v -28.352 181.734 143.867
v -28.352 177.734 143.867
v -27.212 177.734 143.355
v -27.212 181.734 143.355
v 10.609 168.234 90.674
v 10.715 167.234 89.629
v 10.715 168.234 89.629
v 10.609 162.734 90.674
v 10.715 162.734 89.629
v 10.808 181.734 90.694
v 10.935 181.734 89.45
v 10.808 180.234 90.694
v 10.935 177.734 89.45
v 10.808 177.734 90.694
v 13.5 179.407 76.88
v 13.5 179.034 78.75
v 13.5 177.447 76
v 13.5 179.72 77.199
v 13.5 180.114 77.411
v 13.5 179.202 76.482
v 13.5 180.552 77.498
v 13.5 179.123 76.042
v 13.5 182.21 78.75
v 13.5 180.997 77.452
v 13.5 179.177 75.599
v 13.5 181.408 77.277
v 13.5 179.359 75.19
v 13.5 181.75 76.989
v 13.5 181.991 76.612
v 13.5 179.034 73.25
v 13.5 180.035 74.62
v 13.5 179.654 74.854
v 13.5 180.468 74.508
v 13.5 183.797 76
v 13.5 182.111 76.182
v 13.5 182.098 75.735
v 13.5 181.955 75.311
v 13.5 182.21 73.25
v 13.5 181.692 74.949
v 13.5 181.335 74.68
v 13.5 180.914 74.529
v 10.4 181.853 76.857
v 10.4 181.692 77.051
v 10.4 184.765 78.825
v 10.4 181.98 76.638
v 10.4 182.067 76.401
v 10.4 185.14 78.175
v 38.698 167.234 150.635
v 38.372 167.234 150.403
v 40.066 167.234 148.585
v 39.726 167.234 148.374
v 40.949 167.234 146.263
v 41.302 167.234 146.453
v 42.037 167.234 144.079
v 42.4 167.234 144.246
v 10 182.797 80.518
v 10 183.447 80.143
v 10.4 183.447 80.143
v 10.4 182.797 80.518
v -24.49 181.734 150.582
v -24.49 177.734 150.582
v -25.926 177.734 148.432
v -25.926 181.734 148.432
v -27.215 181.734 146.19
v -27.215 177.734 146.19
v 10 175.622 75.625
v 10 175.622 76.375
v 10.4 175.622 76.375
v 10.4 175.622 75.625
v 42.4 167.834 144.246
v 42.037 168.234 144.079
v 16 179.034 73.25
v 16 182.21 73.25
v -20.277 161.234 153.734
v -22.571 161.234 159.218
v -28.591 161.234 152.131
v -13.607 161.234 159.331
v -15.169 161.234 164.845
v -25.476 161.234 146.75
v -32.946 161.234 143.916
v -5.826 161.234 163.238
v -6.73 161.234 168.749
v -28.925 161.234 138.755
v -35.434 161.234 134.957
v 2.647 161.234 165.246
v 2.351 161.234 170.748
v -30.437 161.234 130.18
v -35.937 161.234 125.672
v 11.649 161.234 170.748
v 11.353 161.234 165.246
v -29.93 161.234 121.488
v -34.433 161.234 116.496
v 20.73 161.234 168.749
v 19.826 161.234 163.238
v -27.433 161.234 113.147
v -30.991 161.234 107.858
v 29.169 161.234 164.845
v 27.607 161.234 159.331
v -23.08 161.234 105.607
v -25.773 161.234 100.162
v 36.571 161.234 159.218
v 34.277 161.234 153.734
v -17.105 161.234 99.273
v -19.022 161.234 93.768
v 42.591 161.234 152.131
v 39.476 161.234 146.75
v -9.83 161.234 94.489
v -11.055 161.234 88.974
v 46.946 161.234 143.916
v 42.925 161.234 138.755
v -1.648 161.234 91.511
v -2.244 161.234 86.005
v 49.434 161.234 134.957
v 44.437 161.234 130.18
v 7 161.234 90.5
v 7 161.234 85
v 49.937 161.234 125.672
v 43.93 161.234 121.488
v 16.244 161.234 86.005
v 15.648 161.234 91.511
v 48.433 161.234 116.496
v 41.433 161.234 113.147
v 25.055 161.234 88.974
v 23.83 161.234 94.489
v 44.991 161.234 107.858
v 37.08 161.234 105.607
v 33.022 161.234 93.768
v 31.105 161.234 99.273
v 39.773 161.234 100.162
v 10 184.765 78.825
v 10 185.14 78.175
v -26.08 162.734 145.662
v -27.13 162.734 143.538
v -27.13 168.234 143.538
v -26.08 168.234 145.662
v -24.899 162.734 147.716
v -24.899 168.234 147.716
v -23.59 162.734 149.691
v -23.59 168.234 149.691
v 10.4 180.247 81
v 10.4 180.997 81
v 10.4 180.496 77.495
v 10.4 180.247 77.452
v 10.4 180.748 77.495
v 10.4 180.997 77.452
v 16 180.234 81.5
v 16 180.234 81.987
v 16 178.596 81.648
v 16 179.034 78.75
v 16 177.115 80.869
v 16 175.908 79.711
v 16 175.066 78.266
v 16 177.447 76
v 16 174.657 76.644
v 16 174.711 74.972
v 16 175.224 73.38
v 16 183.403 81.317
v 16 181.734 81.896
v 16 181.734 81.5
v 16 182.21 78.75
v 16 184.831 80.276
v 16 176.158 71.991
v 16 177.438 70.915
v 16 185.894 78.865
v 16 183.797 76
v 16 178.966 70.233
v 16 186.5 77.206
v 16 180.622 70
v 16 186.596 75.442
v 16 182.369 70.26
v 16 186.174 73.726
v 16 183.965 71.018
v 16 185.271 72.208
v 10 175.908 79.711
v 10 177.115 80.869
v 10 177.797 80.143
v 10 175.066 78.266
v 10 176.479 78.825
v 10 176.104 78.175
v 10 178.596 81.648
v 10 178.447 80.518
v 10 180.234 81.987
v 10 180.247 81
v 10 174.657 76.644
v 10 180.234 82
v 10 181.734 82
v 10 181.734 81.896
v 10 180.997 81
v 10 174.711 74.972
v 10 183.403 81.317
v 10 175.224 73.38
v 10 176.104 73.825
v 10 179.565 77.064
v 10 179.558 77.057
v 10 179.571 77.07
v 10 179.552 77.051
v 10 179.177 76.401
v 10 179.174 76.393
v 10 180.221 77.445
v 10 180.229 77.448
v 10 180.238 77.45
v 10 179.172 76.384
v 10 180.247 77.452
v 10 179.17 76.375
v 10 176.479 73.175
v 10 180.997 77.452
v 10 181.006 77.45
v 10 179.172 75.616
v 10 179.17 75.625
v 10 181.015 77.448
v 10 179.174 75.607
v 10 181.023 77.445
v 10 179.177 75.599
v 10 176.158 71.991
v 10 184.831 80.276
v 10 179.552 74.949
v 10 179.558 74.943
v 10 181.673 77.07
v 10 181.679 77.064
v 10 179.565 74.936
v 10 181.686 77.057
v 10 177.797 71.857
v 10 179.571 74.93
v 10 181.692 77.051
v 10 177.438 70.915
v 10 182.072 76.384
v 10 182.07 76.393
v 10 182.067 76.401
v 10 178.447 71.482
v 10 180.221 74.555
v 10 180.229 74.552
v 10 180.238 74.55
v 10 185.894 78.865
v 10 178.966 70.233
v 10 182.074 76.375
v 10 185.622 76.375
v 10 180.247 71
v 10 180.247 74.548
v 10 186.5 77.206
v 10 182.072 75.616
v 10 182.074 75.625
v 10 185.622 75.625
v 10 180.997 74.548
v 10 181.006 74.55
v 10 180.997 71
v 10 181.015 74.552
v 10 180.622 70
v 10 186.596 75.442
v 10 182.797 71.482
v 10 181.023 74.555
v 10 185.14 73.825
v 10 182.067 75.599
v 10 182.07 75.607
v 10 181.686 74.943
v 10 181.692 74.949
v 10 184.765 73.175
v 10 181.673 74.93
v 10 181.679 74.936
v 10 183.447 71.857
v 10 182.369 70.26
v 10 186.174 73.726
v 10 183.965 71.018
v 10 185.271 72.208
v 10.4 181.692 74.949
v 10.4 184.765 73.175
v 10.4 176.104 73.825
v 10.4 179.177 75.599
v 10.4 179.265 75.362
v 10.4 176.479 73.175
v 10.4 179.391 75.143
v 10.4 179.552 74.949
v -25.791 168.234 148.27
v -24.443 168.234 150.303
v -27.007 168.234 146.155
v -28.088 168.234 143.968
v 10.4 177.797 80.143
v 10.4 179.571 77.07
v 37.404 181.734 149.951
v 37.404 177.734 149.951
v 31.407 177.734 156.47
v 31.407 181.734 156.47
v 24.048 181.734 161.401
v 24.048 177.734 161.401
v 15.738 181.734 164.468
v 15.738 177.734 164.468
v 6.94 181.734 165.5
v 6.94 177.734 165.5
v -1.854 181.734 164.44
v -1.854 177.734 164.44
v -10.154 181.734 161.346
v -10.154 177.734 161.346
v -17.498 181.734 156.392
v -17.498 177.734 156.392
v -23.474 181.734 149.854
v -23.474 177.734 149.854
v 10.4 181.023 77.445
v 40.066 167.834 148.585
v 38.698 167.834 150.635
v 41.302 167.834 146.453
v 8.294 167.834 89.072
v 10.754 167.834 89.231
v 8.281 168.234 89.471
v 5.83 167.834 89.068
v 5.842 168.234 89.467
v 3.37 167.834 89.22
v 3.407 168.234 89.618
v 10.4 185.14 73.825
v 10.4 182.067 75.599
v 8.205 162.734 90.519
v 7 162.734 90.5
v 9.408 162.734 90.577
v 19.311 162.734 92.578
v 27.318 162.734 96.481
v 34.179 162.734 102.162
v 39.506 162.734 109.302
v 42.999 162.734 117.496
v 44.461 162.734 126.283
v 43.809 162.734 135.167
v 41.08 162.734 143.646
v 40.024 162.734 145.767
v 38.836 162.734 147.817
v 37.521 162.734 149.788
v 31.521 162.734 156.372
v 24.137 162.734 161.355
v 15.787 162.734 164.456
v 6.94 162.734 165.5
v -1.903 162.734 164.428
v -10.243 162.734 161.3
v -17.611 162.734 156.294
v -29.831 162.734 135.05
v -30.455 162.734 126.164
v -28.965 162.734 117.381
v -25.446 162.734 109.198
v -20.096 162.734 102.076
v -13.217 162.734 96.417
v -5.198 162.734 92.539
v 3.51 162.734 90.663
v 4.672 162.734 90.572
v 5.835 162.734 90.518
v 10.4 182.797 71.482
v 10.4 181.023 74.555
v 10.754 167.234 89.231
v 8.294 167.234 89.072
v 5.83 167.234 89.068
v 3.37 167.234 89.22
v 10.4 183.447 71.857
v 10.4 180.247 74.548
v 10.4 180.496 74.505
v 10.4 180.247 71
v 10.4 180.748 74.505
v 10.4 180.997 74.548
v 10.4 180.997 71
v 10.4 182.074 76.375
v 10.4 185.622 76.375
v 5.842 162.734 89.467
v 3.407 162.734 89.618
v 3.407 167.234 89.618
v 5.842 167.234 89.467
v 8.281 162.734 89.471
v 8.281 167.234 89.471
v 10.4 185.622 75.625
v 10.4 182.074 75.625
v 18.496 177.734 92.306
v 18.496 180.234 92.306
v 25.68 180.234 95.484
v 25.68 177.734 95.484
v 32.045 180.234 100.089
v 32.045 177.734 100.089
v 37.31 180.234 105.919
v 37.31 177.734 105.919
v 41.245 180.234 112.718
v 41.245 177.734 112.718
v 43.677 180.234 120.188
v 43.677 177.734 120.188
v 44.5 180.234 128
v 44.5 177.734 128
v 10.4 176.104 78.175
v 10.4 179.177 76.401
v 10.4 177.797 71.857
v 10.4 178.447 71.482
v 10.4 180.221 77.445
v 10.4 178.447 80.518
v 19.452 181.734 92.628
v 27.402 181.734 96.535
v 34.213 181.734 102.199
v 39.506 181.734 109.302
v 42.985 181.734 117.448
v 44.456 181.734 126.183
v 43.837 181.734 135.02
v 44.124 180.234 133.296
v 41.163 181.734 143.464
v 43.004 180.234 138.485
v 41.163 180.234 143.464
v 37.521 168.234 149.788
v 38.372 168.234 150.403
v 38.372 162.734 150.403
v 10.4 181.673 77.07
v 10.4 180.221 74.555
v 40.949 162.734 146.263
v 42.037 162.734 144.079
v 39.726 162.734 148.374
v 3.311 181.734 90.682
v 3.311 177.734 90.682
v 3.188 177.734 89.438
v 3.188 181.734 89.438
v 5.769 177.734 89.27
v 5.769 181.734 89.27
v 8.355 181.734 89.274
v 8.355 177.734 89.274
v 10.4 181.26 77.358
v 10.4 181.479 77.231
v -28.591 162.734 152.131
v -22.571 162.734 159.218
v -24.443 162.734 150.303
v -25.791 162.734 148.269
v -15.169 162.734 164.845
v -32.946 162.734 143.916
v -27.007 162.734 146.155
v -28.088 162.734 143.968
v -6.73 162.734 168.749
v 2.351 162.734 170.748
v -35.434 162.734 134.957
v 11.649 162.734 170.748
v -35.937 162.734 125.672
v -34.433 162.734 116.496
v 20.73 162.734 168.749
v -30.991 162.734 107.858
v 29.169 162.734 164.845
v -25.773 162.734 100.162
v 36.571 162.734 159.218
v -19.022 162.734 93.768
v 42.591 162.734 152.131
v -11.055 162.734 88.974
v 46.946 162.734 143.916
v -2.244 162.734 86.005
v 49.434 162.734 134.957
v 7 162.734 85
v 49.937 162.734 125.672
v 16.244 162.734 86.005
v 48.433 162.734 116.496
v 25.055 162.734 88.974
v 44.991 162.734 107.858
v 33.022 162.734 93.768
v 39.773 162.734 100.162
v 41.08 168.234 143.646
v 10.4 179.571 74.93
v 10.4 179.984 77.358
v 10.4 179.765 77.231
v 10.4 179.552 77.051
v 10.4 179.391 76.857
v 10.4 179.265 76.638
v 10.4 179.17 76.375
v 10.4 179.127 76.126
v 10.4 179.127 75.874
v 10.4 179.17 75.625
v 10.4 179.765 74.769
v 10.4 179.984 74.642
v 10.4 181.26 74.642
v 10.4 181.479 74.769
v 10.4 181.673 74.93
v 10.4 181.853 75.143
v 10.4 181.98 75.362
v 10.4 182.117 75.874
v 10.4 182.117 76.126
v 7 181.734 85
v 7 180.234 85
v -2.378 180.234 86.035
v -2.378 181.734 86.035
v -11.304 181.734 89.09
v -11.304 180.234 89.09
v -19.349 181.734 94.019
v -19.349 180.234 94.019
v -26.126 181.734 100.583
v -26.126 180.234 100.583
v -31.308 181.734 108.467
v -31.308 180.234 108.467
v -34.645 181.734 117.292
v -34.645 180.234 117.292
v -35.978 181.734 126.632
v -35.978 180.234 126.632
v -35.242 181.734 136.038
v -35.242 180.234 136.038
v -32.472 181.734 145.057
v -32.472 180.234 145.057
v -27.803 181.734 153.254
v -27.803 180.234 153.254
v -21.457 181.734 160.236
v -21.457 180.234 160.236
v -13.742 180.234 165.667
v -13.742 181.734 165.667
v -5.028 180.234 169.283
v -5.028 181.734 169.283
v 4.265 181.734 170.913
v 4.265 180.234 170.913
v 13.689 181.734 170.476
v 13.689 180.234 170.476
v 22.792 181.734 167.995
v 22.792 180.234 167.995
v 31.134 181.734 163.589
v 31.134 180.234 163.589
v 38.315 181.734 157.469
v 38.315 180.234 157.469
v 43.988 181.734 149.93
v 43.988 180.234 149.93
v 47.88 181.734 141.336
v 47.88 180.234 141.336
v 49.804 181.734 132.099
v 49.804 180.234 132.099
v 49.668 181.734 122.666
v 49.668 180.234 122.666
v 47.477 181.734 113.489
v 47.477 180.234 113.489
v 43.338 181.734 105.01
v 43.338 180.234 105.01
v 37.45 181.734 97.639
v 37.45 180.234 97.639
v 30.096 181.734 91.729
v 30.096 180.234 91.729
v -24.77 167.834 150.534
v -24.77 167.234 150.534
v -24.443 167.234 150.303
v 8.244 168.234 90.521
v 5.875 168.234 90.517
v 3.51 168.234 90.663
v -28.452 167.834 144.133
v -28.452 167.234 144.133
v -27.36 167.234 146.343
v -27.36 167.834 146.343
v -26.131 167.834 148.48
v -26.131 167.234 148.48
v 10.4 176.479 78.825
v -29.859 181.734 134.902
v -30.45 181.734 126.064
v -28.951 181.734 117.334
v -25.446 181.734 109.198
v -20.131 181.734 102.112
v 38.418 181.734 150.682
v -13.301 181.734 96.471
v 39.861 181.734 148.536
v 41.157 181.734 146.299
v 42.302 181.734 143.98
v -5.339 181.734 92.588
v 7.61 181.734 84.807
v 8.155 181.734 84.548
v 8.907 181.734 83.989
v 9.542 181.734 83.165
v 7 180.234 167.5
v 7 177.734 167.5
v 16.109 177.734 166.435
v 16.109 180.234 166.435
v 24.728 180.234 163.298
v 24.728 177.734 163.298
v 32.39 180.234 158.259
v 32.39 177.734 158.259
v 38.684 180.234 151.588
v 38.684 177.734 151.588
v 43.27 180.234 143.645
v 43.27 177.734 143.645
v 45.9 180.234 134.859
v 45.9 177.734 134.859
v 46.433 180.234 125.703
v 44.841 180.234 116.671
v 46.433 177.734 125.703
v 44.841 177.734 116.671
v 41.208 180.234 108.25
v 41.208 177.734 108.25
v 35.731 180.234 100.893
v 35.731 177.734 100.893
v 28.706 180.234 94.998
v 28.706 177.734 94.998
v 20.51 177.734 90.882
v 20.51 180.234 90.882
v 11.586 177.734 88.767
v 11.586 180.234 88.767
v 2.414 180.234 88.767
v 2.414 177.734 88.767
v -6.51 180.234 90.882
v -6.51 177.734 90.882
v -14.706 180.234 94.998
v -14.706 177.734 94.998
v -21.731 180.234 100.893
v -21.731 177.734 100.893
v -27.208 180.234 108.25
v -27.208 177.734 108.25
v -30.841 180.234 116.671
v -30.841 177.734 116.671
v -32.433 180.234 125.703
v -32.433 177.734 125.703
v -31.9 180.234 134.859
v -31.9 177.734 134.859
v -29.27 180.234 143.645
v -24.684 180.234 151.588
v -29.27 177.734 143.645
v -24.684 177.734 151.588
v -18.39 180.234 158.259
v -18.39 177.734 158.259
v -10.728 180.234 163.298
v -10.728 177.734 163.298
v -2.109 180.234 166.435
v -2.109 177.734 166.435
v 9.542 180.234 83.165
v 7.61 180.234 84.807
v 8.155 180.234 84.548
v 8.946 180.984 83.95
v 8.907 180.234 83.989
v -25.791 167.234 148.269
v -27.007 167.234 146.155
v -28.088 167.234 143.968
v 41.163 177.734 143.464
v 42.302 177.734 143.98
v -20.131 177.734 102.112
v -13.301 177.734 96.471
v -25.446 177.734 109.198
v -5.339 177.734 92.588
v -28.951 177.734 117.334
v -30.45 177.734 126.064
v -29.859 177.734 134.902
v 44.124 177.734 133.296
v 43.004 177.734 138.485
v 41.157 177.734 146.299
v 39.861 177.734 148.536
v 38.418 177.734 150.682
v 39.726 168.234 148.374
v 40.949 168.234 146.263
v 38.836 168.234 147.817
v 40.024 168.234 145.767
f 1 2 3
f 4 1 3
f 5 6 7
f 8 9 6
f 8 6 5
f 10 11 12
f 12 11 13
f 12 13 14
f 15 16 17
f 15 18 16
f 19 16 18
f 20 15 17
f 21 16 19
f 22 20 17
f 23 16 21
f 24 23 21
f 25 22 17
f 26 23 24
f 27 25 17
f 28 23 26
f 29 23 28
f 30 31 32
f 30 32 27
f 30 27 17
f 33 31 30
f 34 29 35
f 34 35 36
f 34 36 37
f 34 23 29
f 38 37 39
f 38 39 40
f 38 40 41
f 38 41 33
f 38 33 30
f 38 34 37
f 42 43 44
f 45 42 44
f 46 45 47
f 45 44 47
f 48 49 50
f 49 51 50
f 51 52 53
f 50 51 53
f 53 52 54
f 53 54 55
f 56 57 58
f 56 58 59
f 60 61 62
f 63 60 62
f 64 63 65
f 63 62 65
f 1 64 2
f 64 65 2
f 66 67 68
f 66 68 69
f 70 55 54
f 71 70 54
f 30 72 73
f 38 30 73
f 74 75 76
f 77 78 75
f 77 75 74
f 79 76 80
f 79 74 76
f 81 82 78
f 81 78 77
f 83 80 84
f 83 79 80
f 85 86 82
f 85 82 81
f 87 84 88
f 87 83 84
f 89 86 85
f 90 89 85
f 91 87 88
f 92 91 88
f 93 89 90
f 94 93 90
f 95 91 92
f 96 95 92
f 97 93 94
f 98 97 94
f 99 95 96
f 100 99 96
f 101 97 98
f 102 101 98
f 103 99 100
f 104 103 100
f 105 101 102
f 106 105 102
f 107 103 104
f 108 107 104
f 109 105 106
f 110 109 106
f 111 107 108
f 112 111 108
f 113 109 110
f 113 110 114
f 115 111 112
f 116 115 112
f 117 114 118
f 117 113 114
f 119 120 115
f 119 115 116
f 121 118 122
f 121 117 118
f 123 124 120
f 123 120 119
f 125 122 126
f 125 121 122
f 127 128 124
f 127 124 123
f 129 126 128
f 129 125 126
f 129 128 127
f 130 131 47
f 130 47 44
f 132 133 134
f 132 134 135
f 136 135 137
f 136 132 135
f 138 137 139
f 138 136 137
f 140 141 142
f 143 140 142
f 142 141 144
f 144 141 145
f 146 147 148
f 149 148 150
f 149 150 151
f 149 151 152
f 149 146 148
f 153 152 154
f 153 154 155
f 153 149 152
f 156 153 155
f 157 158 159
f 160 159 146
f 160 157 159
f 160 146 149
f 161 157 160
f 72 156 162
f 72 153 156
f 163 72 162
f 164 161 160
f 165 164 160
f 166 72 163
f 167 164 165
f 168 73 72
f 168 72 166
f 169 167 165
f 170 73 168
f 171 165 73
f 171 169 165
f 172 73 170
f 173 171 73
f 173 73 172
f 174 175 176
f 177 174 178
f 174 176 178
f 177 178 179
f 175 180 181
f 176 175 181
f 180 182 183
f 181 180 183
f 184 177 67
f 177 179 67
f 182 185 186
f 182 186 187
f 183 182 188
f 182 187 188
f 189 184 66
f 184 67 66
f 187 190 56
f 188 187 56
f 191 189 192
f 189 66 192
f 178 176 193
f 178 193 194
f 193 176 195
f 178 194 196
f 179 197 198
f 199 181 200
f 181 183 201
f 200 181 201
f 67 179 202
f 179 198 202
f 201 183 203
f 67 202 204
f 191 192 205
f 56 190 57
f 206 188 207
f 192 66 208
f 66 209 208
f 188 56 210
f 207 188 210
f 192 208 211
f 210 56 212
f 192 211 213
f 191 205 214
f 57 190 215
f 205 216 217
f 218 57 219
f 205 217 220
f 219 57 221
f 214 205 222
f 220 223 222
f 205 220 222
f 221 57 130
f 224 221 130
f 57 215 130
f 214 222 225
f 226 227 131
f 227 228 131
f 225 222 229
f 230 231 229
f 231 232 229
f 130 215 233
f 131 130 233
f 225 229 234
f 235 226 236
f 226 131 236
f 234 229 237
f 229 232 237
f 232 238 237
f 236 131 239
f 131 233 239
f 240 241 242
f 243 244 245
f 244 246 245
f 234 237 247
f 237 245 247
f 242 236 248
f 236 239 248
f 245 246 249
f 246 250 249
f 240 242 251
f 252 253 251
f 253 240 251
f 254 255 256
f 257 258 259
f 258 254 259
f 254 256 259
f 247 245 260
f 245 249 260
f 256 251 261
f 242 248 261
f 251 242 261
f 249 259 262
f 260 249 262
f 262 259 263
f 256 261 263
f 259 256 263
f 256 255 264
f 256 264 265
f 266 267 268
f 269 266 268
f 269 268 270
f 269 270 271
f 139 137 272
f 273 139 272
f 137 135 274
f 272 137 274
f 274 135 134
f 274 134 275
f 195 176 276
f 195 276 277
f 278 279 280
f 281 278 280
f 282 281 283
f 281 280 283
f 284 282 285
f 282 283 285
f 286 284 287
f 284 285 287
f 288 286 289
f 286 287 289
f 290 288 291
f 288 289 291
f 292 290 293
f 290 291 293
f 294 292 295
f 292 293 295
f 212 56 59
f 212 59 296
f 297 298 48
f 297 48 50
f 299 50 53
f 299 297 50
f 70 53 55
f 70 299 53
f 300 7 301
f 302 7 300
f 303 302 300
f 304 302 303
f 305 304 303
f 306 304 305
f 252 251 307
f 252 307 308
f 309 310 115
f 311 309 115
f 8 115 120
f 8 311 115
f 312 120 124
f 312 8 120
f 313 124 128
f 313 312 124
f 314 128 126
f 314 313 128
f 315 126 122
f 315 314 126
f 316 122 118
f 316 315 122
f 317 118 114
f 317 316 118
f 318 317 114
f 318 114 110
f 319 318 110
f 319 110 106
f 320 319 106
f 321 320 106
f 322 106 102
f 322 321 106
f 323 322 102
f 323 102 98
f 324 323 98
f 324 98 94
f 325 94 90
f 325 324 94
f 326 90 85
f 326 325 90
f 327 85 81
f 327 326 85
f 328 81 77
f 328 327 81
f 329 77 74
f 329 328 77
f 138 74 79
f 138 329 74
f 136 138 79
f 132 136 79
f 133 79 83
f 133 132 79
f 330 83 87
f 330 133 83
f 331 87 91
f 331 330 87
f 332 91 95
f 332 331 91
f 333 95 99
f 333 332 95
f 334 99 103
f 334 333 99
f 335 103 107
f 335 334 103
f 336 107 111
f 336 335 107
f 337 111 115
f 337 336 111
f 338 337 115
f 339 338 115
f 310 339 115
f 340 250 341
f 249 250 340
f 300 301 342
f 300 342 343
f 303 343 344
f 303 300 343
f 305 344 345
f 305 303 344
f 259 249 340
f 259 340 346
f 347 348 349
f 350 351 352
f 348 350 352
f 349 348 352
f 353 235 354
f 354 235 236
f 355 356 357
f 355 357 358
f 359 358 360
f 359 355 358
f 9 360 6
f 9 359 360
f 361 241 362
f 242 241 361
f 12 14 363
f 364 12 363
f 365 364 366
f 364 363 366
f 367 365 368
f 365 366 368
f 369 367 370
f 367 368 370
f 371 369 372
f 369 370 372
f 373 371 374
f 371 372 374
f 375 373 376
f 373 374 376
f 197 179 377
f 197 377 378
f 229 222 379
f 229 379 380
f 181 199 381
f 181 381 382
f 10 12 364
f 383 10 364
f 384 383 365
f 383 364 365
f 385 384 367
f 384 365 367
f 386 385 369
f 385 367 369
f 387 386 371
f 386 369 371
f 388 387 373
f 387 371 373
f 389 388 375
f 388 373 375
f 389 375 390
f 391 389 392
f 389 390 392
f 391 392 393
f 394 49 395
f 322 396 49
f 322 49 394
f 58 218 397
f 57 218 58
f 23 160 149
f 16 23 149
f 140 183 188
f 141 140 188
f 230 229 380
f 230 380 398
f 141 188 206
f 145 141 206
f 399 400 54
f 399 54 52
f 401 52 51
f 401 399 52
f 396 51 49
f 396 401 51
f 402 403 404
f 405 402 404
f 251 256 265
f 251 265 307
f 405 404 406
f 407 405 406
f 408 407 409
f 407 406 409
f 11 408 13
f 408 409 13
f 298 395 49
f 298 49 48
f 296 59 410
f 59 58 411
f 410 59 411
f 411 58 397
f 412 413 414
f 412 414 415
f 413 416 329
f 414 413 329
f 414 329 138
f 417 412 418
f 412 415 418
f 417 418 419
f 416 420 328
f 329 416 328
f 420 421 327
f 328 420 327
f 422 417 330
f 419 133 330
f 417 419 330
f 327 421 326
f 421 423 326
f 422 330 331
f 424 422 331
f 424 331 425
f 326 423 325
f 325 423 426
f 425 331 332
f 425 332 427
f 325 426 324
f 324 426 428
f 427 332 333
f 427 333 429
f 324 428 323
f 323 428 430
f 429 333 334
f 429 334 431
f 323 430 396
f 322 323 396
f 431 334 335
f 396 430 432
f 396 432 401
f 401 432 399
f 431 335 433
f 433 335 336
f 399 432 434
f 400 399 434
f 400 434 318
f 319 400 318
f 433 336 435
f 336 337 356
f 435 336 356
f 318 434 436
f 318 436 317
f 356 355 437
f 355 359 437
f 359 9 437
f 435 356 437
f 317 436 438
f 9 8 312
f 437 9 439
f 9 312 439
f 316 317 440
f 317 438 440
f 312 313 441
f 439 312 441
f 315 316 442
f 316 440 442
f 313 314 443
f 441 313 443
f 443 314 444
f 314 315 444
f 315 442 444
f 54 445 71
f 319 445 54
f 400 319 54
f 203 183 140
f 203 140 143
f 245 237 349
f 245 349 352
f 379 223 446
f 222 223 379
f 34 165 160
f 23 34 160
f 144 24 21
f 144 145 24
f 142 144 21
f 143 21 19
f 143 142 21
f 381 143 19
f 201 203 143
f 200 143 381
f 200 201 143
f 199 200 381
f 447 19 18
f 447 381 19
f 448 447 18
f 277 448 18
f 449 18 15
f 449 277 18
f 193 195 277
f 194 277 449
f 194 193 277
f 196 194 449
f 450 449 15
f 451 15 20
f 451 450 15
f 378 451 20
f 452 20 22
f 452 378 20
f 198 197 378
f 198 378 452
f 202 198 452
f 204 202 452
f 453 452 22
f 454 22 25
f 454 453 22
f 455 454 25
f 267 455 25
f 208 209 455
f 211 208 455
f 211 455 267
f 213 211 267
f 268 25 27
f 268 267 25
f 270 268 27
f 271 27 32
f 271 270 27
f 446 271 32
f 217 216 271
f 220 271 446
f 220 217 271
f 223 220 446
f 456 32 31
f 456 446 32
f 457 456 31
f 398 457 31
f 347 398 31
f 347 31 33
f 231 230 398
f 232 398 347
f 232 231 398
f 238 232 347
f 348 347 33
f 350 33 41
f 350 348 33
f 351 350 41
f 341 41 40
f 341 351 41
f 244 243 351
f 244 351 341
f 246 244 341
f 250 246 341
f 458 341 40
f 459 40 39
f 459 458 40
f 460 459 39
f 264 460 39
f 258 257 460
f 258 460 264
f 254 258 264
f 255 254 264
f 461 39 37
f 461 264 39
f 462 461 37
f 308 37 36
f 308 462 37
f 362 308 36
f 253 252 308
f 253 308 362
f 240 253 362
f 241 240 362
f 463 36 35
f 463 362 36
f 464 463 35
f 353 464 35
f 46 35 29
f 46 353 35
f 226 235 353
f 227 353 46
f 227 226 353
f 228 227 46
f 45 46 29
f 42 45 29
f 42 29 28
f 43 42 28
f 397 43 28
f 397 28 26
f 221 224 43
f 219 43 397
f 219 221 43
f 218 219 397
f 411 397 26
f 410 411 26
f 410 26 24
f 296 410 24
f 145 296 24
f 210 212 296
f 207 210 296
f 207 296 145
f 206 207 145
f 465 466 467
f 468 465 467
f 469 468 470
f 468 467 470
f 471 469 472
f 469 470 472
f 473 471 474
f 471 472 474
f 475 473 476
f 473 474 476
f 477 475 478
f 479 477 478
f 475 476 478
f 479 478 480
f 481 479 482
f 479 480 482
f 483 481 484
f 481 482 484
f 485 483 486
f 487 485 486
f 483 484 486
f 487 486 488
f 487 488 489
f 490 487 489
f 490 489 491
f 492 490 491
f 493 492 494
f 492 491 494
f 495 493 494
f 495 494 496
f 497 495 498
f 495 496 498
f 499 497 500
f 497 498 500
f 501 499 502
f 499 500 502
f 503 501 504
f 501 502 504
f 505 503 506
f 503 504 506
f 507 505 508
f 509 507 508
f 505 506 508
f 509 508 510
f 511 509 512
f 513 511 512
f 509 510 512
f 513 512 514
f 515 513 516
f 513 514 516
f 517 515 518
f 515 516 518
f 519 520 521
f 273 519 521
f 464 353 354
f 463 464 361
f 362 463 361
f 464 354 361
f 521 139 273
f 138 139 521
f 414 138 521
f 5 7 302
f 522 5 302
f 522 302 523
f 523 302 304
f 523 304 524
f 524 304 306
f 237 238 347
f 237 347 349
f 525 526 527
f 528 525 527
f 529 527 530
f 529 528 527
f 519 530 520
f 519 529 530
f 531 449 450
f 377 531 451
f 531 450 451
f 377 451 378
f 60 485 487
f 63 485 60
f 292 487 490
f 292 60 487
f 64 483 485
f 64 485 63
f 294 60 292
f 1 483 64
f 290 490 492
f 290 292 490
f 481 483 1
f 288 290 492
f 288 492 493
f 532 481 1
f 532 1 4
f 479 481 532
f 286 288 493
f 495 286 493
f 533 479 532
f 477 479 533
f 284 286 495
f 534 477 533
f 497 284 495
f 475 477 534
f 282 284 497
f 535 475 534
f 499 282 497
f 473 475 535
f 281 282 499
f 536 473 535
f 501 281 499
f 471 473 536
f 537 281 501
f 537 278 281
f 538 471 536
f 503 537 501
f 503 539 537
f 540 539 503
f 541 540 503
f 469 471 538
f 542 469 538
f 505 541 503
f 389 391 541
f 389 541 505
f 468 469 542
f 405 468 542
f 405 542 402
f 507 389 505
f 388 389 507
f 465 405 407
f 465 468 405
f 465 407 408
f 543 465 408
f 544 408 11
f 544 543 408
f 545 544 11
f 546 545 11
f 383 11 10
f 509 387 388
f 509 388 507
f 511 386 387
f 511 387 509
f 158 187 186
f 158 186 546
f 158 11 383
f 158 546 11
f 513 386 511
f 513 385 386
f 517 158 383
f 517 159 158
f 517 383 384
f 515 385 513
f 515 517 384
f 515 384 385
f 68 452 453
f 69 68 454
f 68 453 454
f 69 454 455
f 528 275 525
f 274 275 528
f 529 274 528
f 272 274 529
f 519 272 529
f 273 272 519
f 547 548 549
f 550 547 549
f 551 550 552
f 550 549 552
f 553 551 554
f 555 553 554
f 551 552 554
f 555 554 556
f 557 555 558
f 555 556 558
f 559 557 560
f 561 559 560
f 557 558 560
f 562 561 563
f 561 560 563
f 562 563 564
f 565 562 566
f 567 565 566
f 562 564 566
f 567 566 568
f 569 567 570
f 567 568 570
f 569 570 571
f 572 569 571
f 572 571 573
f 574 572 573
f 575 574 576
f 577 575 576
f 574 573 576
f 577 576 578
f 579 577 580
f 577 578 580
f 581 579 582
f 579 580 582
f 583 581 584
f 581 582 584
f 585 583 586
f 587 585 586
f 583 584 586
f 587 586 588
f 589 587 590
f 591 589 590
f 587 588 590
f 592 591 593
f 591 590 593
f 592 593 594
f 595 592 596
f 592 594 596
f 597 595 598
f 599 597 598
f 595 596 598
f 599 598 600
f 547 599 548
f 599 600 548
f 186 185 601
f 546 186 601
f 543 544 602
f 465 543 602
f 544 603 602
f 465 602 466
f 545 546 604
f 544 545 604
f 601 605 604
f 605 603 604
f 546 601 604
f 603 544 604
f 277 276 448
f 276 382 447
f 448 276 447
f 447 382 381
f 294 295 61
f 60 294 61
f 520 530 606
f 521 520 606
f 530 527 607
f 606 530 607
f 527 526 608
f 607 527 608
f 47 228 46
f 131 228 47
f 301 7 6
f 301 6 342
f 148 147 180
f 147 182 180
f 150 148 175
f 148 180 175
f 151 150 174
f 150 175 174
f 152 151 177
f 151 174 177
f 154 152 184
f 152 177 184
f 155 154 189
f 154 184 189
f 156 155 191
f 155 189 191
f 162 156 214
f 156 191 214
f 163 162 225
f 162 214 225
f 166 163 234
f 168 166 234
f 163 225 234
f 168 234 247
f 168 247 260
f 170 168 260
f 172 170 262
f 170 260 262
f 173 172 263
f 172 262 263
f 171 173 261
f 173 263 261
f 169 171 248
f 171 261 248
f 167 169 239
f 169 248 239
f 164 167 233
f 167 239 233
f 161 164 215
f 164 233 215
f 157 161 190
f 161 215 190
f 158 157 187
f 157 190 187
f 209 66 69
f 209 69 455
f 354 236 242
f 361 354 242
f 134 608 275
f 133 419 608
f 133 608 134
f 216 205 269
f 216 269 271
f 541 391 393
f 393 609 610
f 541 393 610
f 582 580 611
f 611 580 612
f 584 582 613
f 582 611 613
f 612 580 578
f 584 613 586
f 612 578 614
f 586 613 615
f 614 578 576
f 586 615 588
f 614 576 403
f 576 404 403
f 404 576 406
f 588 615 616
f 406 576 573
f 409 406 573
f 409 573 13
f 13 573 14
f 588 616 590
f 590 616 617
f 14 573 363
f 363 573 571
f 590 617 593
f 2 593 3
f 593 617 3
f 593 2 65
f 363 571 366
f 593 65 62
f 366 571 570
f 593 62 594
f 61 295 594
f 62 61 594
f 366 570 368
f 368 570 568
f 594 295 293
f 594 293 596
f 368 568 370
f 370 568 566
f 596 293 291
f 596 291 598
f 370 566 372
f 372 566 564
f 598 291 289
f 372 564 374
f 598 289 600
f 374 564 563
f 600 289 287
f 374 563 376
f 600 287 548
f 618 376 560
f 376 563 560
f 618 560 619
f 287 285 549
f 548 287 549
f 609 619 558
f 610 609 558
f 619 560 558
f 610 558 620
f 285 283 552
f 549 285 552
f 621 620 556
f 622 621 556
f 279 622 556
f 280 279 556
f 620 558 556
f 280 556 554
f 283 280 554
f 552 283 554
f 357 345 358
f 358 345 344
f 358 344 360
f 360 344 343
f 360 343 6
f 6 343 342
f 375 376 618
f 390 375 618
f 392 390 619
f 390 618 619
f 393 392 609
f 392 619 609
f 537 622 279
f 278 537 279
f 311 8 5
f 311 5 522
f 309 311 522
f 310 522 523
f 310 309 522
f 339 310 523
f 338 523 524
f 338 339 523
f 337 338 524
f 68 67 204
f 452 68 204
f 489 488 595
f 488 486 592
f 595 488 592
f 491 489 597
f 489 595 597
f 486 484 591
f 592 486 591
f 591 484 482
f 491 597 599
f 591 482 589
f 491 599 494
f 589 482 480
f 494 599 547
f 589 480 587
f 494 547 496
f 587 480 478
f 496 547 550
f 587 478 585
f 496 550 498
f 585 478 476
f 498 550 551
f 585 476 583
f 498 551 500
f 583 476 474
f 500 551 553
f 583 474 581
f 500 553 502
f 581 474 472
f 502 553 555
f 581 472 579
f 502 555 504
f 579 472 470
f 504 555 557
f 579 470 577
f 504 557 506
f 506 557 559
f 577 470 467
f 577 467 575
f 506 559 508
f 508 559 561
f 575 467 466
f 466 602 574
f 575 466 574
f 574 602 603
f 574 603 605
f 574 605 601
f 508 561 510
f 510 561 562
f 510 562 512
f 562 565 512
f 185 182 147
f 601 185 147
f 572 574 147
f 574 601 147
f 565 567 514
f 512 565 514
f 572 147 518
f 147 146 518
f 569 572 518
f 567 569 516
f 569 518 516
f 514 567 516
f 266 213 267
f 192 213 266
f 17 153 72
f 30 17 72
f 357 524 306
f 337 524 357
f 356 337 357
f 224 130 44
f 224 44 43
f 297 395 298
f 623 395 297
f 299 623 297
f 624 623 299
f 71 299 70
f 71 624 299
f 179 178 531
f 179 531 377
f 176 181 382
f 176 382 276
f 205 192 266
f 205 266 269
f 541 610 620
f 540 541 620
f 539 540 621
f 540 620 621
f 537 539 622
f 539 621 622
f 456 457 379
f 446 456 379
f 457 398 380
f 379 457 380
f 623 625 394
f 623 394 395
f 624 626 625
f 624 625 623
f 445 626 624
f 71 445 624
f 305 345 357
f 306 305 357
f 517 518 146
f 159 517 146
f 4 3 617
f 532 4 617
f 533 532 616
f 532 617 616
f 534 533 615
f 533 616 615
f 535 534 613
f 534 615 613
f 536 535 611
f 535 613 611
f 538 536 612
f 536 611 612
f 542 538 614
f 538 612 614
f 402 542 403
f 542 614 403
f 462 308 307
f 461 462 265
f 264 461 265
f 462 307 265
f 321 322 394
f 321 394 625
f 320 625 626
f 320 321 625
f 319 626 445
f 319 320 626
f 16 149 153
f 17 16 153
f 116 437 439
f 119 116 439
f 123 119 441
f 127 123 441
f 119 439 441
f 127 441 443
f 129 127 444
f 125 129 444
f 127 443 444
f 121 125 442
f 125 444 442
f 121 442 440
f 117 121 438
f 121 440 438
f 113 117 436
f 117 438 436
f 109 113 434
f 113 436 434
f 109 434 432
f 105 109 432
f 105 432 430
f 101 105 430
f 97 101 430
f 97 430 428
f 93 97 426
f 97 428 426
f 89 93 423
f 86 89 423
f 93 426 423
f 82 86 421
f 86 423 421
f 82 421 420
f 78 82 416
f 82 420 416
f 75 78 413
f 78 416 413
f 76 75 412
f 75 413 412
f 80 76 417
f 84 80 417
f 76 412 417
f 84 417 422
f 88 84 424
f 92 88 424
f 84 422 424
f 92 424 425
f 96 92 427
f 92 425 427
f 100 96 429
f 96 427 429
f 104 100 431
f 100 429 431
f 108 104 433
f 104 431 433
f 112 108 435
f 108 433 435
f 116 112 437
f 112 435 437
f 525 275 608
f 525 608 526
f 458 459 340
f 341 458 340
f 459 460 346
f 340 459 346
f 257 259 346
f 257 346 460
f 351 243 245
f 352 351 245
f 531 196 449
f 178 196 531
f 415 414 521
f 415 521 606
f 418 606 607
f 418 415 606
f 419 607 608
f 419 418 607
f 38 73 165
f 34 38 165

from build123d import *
from build123d.topology import SkipClean

# Parameters (mm, degrees)
ESBO_O120_R                = 6
RESSALTO_EXTRUS_O39_DEPTH  = 6
ESBO_O120_3_W              = 10
ESBO_O120_3_H              = 0.75
ESBO_O120_3_W_2            = 0.75
ESBO_O120_3_H_2            = 10
CORTE_EXTRUS_O_FINA1_DEPTH = 0.4
CORTE_EXTRUS_O49_REACH     = 205.931
ESBO_O120_4_R              = 1.5
CORTE_EXTRUS_O50_DEPTH     = 2.5
RESSALTO_EXTRUS_O40_DEPTH  = 1.5
RESSALTO_EXTRUS_O41_START  = -2.5
ESBO_O122_12_R             = 39.5
RESSALTO_EXTRUS_O41_DEPTH  = 2.5
ESBO_O123_R                = 43
ESBO_O123_R_2              = 37.5
RESSALTO_EXTRUS_O42_DEPTH  = 1.5
RESSALTO_EXTRUS_O43_DEPTH  = 5.5
RESSALTO_EXTRUS_O44_DEPTH  = 1
CHANFRO1_SIZE              = 0.4


with BuildPart() as part:
    # Esboço120 → Ressalto-extrusão39 (new body)
    with BuildSketch(Plane(origin=(10, 0, 0), x_dir=(0, 0, -1), z_dir=(1, 0, 0))):
        with Locations((-76, 180.622055231)):
            Circle(ESBO_O120_R)
    extrude(amount=RESSALTO_EXTRUS_O39_DEPTH)

    # Esboço120<3> → Corte-Extrusão-Fina1 (cut)
    with BuildSketch(Plane(origin=(10, 0, 0), x_dir=(0, 0, -1), z_dir=(1, 0, 0))):
        Polygon((-78.824759526, 184.76468225), (-73.824759526, 176.104428212), (-73.175240474, 176.479428212), (-78.175240474, 185.13968225), align=None)
        Polygon((-78.175240474, 176.104428212), (-73.175240474, 184.76468225), (-73.824759526, 185.13968225), (-78.824759526, 176.479428212), align=None)
        Polygon((-80.142627019, 177.797295704), (-71.482372981, 182.797295704), (-71.857372981, 183.446814757), (-80.517627019, 178.446814757), align=None)
        with Locations((-76, 180.622055231)):
            Rectangle(ESBO_O120_3_W, ESBO_O120_3_H)
        Polygon((-71.482372981, 178.446814757), (-80.142627019, 183.446814757), (-80.517627019, 182.797295704), (-71.857372981, 177.797295704), align=None)
        with Locations((-76, 180.622055231)):
            Rectangle(ESBO_O120_3_W_2, ESBO_O120_3_H_2)
    extrude(amount=CORTE_EXTRUS_O_FINA1_DEPTH, mode=Mode.SUBTRACT)

    # Esboço120<4> → Corte-extrusão49 (cut, up to next)
    with BuildSketch(Plane(origin=(10, 0, 0), x_dir=(0, 0, -1), z_dir=(1, 0, 0)), mode=Mode.PRIVATE) as corte_extrus_o49_sk1:
        with Locations(Location((-76, 180.622055231, 0), (0, 0, 165.522487814))):
            Circle(ESBO_O120_4_R)
    corte_extrus_o49_tool1 = extrude(corte_extrus_o49_sk1.sketch, amount=CORTE_EXTRUS_O49_REACH, mode=Mode.PRIVATE) & part.part
    add(corte_extrus_o49_tool1.solids().sort_by_distance((10, 180.622055, 76))[0], mode=Mode.SUBTRACT)

    # Esboço121 → Corte-extrusão50 (cut)
    with BuildSketch(Plane(origin=(16, 0, 0), x_dir=(0, 0, -1), z_dir=(1, 0, 0))):
        Polygon((-76, 183.797481711), (-78.75, 182.209768471), (-78.75, 179.03434199), (-76, 177.44662875), (-73.25, 179.03434199), (-73.25, 182.209768471), align=None)
    extrude(amount=-CORTE_EXTRUS_O50_DEPTH, mode=Mode.SUBTRACT)

    # Esboço122 → Ressalto-extrusão40 (add)
    with BuildSketch(Plane(origin=(0, 180.233826663, 0), x_dir=(1, 0, 0), z_dir=(0, 1, 0))):
        with BuildLine():
            Line((10, -81.5), (10, -82))
            add(Edge.make_bspline(
                [(10, -82), (9.391813157, -84.399749478), (7, -85)],
                knots=[0, 0, 0, 1, 1, 1], degree=2))
            ThreePointArc((7, -85), (-5.028043514, -169.28348543), (30.095793449, -91.729015385))
            Line((30.095793449, -91.729015385), (16, -81.5))
            Line((16, -81.5), (10, -81.5))
        make_face()
        with BuildLine():
            ThreePointArc((10.807751981, -90.693820554), (39.505758511, -109.301720303), (41.162914828, -143.464321855))
            Line((41.162914828, -143.464321855), (42.301678656, -143.97979925))
            ThreePointArc((42.301678656, -143.97979925), (40.527599963, -147.428395218), (38.417697232, -150.682389659))
            Line((38.417697232, -150.682389659), (37.404223128, -149.95069967))
            ThreePointArc((37.404223128, -149.95069967), (6.940305969, -165.499952488), (-23.473952993, -149.853791181))
            Line((-23.473952993, -149.853791181), (-24.489751426, -150.582250887))
            ThreePointArc((-24.489751426, -150.582250887), (-26.589283795, -147.321555687), (-28.352374279, -143.867329102))
            Line((-28.352374279, -143.867329102), (-27.211975109, -143.355479776))
            ThreePointArc((-27.211975109, -143.355479776), (-25.44606448, -109.198327209), (3.311038165, -90.681886964))
            Line((3.311038165, -90.681886964), (3.18807277, -89.437949863))
            ThreePointArc((3.18807277, -89.437949863), (7.061683832, -89.250049095), (10.934677047, -89.450281239))
            Line((10.934677047, -89.450281239), (10.807751981, -90.693820554))
        make_face(mode=Mode.SUBTRACT)
    extrude(amount=RESSALTO_EXTRUS_O40_DEPTH)

    # Esboço122<12> → Ressalto-extrusão41 (add)
    with BuildSketch(Plane(origin=(0, 180.233826663, 0), x_dir=(1, 0, 0), z_dir=(0, 1, 0)).offset(RESSALTO_EXTRUS_O41_START)):
        with Locations(Location((7, -128, 0), (0, 0, 270))):
            Circle(ESBO_O122_12_R)
        with BuildLine():
            Line((10.934677047, -89.450281239), (10.807751981, -90.693820554))
            ThreePointArc((10.807751981, -90.693820554), (34.830205706, -102.865767361), (44.5, -128))
            ThreePointArc((44.5, -128), (43.656236209, -135.910142032), (41.162914828, -143.464321855))
            Line((41.162914828, -143.464321855), (42.301678656, -143.97979925))
            ThreePointArc((42.301678656, -143.97979925), (40.527599963, -147.428395218), (38.417697232, -150.682389659))
            Line((38.417697232, -150.682389659), (37.404223128, -149.95069967))
            ThreePointArc((37.404223128, -149.95069967), (6.940305969, -165.499952488), (-23.473952993, -149.853791181))
            Line((-23.473952993, -149.853791181), (-24.489751426, -150.582250887))
            ThreePointArc((-24.489751426, -150.582250887), (-26.589283795, -147.321555687), (-28.352374279, -143.867329102))
            Line((-28.352374279, -143.867329102), (-27.211975109, -143.355479776))
            ThreePointArc((-27.211975109, -143.355479776), (-25.44606448, -109.198327209), (3.311038165, -90.681886964))
            Line((3.311038165, -90.681886964), (3.18807277, -89.437949863))
            ThreePointArc((3.18807277, -89.437949863), (7.061683832, -89.250049095), (10.934677047, -89.450281239))
        make_face(mode=Mode.SUBTRACT)
    extrude(amount=RESSALTO_EXTRUS_O41_DEPTH)


with BuildPart() as body_2:
    # Esboço123 → Ressalto-extrusão42 (new body)
    with BuildSketch(Plane(origin=(0, 162.733826663, 0), x_dir=(-1, 0, 0), z_dir=(0, -1, 0))):
        with Locations(Location((-7, -128, 0), (0, 0, 90))):
            Circle(ESBO_O123_R)
        with Locations(Location((-7, -128, 0), (0, 0, 90))):
            Circle(ESBO_O123_R_2, mode=Mode.SUBTRACT)
    extrude(amount=RESSALTO_EXTRUS_O42_DEPTH)

    # Esboço123<3> → Ressalto-extrusão43 (add)
    with SkipClean():  # the faces are left unmerged after this step: merging them gives an invalid solid
        with BuildSketch(Plane(origin=(0, 162.733826663, 0), x_dir=(-1, 0, 0), z_dir=(0, -1, 0))):
            with BuildLine():
                ThreePointArc((-37.520861107, -149.788231623), (-39.44606448, -146.801672791), (-41.079952569, -143.646304129))
                Line((-41.079952569, -143.646304129), (-42.036527418, -144.079311132))
                ThreePointArc((-42.036527418, -144.079311132), (-40.354554285, -147.32811963), (-38.372191133, -150.402859717))
                Line((-38.372191133, -150.402859717), (-37.520861107, -149.788231623))
            make_face()
            with BuildLine():
                Line((28.087541199, -143.967684635), (27.129592643, -143.537725253))
                ThreePointArc((27.129592643, -143.537725253), (25.505758511, -146.698279697), (23.590073136, -149.69095262))
                Line((23.590073136, -149.69095262), (24.443355624, -150.302867239))
                ThreePointArc((24.443355624, -150.302867239), (26.415919749, -147.221831528), (28.087541199, -143.967684635))
            make_face()
            with BuildLine():
                Line((-10.715350066, -89.629455648), (-10.608731536, -90.674043124))
                ThreePointArc((-10.608731536, -90.674043124), (-7.059694031, -90.500047512), (-3.510120567, -90.662743251))
                Line((-3.510120567, -90.662743251), (-3.406828206, -89.61782163))
                ThreePointArc((-3.406828206, -89.61782163), (-7.061365464, -89.450048842), (-10.715350066, -89.629455648))
            make_face()
        extrude(amount=-RESSALTO_EXTRUS_O43_DEPTH)

    # Esboço124 → Ressalto-extrusão44 (add)
    with SkipClean():  # the faces are left unmerged after this step: merging them gives an invalid solid
        with BuildSketch(Plane(origin=(0, 168.233826663, 0), x_dir=(1, 0, 0), z_dir=(0, 1, 0))):
            with BuildLine():
                Line((38.372191133, -150.402859717), (38.69771322, -150.635314812))
                ThreePointArc((38.69771322, -150.635314812), (40.70064564, -147.528670806), (42.400071153, -144.246152233))
                Line((42.400071153, -144.246152233), (42.036527418, -144.079311132))
                ThreePointArc((42.036527418, -144.079311132), (40.354554285, -147.32811963), (38.372191133, -150.402859717))
            make_face()
            with BuildLine():
                Line((10.715350066, -89.629455648), (10.75390104, -89.231317704))
                ThreePointArc((10.75390104, -89.231317704), (7.0620022, -89.050049349), (3.369544971, -89.219562969))
                Line((3.369544971, -89.219562969), (3.406828206, -89.61782163))
                ThreePointArc((3.406828206, -89.61782163), (7.061365464, -89.450048842), (10.715350066, -89.629455648))
            make_face()
            with BuildLine():
                Line((-28.087541199, -143.967684635), (-28.45161426, -144.133367484))
                ThreePointArc((-28.45161426, -144.133367484), (-26.76264784, -147.421279845), (-24.769616124, -150.534284798))
                Line((-24.769616124, -150.534284798), (-24.443355624, -150.302867239))
                ThreePointArc((-24.443355624, -150.302867239), (-26.415919749, -147.221831528), (-28.087541199, -143.967684635))
            make_face()
        extrude(amount=-RESSALTO_EXTRUS_O44_DEPTH)

    # Chanfro1
    chanfro1_edges = [body_2.edges().sort_by_distance(p)[0] for p in [
        (40.70064564, 168.233826663, 147.528670806),
        (-26.76264784, 168.233826663, 147.421279845),
        (7.0620022, 168.233826663, 89.050049349),
    ]]
    chamfer(chanfro1_edges, length=CHANFRO1_SIZE - 0.0001)  # a hair under: the kernel refuses the full size


solid = Compound([part.part, body_2.part])
